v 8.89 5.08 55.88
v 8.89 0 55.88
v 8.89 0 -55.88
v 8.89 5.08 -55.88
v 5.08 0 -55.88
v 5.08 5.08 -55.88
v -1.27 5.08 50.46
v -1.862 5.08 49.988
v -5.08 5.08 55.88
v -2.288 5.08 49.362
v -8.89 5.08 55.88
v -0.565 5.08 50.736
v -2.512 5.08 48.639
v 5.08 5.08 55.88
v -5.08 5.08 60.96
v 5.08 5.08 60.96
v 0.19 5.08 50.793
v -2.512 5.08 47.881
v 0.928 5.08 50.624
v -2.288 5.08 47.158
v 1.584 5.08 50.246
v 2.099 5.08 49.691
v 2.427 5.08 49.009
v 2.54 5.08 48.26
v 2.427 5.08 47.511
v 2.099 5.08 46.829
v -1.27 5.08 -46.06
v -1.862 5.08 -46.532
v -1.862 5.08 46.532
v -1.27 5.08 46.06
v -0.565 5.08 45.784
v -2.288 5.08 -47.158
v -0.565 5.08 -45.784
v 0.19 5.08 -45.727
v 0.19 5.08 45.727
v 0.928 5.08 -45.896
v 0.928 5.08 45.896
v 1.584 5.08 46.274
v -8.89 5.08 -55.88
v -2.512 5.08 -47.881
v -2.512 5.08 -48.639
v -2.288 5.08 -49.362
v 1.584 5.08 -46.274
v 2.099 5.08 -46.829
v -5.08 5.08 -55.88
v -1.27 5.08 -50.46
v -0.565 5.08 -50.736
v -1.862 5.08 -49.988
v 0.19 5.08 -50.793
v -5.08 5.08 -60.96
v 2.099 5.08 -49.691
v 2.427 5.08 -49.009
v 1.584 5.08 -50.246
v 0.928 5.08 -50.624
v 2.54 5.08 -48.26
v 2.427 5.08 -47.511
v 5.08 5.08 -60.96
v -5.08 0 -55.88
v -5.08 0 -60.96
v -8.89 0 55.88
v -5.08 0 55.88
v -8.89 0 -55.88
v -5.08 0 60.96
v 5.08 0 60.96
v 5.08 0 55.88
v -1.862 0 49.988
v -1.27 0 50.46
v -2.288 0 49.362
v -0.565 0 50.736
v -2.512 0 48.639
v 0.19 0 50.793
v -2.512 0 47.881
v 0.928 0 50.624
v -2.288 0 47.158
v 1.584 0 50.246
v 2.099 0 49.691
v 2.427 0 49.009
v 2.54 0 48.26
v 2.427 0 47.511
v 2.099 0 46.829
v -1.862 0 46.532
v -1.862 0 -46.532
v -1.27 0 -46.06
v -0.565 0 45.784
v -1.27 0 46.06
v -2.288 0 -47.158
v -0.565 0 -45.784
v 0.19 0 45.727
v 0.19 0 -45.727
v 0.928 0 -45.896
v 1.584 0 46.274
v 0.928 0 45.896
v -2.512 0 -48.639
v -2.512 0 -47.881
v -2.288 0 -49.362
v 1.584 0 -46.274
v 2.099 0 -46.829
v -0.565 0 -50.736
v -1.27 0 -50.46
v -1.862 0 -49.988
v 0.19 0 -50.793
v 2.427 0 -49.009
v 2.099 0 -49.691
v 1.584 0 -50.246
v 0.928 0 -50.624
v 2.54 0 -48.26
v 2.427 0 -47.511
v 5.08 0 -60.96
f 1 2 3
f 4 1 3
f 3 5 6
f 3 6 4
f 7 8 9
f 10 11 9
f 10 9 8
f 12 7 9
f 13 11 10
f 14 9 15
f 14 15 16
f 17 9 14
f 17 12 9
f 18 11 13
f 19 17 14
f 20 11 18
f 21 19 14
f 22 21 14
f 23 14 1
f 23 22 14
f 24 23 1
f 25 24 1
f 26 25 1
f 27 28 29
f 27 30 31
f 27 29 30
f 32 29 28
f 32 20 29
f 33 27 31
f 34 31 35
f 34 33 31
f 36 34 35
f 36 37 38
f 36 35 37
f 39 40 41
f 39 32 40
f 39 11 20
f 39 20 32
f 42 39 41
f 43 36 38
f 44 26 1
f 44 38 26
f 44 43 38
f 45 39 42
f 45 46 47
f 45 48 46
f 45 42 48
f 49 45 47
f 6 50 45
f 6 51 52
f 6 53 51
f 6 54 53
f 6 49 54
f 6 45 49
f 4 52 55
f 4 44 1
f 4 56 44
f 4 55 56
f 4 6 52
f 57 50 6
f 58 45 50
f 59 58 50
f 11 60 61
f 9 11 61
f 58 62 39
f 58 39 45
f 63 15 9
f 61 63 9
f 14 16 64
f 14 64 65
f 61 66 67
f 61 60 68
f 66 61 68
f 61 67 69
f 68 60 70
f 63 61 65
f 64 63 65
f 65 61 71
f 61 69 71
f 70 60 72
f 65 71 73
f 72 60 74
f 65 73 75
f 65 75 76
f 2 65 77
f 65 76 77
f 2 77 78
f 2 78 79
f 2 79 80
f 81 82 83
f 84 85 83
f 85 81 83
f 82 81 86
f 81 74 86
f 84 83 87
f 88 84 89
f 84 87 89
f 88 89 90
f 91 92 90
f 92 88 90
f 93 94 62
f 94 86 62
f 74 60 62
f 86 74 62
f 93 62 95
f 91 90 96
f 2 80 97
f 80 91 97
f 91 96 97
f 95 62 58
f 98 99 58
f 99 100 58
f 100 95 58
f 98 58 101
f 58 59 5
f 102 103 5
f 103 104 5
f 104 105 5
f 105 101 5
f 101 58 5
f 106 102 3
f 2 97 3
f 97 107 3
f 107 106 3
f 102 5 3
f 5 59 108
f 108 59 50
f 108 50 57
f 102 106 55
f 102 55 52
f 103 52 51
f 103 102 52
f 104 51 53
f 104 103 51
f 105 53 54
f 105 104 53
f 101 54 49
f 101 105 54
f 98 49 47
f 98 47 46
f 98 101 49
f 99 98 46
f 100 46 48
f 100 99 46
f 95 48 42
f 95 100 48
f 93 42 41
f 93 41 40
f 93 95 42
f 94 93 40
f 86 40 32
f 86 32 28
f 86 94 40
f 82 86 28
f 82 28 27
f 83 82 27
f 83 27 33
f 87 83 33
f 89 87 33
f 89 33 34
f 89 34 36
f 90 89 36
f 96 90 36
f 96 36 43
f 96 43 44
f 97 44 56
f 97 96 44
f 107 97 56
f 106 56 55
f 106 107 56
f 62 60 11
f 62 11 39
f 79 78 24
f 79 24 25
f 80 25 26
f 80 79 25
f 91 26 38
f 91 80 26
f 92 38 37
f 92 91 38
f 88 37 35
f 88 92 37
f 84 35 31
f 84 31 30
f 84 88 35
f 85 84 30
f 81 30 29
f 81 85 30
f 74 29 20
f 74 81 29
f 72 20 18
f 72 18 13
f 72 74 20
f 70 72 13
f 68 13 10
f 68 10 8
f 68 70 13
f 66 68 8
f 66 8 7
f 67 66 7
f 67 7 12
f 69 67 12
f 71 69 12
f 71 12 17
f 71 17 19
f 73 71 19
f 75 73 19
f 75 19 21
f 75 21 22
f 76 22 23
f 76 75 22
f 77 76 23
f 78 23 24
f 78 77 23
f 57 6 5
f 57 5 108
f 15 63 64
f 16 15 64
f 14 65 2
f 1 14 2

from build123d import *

# Parameters (mm, degrees)
SKETCH1_W           = 17.78
SKETCH1_H           = 111.76
SKETCH1_R           = 2.54
SKETCH1_W_2         = 10.16
SKETCH1_H_2         = 5.08
BOSS_EXTRUDE1_DEPTH = 5.08


with BuildPart() as part:
    # Sketch1 → Boss-Extrude1 (new body)
    with BuildSketch(Plane(origin=(0, 0, 0), x_dir=(1, 0, 0), z_dir=(0, 1, 0))):
        Rectangle(SKETCH1_W, SKETCH1_H)
        with Locations((0, 48.26)):
            Circle(SKETCH1_R, mode=Mode.SUBTRACT)
        with Locations((0, -48.26)):
            Circle(SKETCH1_R, mode=Mode.SUBTRACT)
        with Locations((0, 58.42)):
            Rectangle(SKETCH1_W_2, SKETCH1_H_2)
        with Locations((0, -58.42)):
            Rectangle(SKETCH1_W_2, SKETCH1_H_2)
    extrude(amount=BOSS_EXTRUDE1_DEPTH)


solid = part.part
